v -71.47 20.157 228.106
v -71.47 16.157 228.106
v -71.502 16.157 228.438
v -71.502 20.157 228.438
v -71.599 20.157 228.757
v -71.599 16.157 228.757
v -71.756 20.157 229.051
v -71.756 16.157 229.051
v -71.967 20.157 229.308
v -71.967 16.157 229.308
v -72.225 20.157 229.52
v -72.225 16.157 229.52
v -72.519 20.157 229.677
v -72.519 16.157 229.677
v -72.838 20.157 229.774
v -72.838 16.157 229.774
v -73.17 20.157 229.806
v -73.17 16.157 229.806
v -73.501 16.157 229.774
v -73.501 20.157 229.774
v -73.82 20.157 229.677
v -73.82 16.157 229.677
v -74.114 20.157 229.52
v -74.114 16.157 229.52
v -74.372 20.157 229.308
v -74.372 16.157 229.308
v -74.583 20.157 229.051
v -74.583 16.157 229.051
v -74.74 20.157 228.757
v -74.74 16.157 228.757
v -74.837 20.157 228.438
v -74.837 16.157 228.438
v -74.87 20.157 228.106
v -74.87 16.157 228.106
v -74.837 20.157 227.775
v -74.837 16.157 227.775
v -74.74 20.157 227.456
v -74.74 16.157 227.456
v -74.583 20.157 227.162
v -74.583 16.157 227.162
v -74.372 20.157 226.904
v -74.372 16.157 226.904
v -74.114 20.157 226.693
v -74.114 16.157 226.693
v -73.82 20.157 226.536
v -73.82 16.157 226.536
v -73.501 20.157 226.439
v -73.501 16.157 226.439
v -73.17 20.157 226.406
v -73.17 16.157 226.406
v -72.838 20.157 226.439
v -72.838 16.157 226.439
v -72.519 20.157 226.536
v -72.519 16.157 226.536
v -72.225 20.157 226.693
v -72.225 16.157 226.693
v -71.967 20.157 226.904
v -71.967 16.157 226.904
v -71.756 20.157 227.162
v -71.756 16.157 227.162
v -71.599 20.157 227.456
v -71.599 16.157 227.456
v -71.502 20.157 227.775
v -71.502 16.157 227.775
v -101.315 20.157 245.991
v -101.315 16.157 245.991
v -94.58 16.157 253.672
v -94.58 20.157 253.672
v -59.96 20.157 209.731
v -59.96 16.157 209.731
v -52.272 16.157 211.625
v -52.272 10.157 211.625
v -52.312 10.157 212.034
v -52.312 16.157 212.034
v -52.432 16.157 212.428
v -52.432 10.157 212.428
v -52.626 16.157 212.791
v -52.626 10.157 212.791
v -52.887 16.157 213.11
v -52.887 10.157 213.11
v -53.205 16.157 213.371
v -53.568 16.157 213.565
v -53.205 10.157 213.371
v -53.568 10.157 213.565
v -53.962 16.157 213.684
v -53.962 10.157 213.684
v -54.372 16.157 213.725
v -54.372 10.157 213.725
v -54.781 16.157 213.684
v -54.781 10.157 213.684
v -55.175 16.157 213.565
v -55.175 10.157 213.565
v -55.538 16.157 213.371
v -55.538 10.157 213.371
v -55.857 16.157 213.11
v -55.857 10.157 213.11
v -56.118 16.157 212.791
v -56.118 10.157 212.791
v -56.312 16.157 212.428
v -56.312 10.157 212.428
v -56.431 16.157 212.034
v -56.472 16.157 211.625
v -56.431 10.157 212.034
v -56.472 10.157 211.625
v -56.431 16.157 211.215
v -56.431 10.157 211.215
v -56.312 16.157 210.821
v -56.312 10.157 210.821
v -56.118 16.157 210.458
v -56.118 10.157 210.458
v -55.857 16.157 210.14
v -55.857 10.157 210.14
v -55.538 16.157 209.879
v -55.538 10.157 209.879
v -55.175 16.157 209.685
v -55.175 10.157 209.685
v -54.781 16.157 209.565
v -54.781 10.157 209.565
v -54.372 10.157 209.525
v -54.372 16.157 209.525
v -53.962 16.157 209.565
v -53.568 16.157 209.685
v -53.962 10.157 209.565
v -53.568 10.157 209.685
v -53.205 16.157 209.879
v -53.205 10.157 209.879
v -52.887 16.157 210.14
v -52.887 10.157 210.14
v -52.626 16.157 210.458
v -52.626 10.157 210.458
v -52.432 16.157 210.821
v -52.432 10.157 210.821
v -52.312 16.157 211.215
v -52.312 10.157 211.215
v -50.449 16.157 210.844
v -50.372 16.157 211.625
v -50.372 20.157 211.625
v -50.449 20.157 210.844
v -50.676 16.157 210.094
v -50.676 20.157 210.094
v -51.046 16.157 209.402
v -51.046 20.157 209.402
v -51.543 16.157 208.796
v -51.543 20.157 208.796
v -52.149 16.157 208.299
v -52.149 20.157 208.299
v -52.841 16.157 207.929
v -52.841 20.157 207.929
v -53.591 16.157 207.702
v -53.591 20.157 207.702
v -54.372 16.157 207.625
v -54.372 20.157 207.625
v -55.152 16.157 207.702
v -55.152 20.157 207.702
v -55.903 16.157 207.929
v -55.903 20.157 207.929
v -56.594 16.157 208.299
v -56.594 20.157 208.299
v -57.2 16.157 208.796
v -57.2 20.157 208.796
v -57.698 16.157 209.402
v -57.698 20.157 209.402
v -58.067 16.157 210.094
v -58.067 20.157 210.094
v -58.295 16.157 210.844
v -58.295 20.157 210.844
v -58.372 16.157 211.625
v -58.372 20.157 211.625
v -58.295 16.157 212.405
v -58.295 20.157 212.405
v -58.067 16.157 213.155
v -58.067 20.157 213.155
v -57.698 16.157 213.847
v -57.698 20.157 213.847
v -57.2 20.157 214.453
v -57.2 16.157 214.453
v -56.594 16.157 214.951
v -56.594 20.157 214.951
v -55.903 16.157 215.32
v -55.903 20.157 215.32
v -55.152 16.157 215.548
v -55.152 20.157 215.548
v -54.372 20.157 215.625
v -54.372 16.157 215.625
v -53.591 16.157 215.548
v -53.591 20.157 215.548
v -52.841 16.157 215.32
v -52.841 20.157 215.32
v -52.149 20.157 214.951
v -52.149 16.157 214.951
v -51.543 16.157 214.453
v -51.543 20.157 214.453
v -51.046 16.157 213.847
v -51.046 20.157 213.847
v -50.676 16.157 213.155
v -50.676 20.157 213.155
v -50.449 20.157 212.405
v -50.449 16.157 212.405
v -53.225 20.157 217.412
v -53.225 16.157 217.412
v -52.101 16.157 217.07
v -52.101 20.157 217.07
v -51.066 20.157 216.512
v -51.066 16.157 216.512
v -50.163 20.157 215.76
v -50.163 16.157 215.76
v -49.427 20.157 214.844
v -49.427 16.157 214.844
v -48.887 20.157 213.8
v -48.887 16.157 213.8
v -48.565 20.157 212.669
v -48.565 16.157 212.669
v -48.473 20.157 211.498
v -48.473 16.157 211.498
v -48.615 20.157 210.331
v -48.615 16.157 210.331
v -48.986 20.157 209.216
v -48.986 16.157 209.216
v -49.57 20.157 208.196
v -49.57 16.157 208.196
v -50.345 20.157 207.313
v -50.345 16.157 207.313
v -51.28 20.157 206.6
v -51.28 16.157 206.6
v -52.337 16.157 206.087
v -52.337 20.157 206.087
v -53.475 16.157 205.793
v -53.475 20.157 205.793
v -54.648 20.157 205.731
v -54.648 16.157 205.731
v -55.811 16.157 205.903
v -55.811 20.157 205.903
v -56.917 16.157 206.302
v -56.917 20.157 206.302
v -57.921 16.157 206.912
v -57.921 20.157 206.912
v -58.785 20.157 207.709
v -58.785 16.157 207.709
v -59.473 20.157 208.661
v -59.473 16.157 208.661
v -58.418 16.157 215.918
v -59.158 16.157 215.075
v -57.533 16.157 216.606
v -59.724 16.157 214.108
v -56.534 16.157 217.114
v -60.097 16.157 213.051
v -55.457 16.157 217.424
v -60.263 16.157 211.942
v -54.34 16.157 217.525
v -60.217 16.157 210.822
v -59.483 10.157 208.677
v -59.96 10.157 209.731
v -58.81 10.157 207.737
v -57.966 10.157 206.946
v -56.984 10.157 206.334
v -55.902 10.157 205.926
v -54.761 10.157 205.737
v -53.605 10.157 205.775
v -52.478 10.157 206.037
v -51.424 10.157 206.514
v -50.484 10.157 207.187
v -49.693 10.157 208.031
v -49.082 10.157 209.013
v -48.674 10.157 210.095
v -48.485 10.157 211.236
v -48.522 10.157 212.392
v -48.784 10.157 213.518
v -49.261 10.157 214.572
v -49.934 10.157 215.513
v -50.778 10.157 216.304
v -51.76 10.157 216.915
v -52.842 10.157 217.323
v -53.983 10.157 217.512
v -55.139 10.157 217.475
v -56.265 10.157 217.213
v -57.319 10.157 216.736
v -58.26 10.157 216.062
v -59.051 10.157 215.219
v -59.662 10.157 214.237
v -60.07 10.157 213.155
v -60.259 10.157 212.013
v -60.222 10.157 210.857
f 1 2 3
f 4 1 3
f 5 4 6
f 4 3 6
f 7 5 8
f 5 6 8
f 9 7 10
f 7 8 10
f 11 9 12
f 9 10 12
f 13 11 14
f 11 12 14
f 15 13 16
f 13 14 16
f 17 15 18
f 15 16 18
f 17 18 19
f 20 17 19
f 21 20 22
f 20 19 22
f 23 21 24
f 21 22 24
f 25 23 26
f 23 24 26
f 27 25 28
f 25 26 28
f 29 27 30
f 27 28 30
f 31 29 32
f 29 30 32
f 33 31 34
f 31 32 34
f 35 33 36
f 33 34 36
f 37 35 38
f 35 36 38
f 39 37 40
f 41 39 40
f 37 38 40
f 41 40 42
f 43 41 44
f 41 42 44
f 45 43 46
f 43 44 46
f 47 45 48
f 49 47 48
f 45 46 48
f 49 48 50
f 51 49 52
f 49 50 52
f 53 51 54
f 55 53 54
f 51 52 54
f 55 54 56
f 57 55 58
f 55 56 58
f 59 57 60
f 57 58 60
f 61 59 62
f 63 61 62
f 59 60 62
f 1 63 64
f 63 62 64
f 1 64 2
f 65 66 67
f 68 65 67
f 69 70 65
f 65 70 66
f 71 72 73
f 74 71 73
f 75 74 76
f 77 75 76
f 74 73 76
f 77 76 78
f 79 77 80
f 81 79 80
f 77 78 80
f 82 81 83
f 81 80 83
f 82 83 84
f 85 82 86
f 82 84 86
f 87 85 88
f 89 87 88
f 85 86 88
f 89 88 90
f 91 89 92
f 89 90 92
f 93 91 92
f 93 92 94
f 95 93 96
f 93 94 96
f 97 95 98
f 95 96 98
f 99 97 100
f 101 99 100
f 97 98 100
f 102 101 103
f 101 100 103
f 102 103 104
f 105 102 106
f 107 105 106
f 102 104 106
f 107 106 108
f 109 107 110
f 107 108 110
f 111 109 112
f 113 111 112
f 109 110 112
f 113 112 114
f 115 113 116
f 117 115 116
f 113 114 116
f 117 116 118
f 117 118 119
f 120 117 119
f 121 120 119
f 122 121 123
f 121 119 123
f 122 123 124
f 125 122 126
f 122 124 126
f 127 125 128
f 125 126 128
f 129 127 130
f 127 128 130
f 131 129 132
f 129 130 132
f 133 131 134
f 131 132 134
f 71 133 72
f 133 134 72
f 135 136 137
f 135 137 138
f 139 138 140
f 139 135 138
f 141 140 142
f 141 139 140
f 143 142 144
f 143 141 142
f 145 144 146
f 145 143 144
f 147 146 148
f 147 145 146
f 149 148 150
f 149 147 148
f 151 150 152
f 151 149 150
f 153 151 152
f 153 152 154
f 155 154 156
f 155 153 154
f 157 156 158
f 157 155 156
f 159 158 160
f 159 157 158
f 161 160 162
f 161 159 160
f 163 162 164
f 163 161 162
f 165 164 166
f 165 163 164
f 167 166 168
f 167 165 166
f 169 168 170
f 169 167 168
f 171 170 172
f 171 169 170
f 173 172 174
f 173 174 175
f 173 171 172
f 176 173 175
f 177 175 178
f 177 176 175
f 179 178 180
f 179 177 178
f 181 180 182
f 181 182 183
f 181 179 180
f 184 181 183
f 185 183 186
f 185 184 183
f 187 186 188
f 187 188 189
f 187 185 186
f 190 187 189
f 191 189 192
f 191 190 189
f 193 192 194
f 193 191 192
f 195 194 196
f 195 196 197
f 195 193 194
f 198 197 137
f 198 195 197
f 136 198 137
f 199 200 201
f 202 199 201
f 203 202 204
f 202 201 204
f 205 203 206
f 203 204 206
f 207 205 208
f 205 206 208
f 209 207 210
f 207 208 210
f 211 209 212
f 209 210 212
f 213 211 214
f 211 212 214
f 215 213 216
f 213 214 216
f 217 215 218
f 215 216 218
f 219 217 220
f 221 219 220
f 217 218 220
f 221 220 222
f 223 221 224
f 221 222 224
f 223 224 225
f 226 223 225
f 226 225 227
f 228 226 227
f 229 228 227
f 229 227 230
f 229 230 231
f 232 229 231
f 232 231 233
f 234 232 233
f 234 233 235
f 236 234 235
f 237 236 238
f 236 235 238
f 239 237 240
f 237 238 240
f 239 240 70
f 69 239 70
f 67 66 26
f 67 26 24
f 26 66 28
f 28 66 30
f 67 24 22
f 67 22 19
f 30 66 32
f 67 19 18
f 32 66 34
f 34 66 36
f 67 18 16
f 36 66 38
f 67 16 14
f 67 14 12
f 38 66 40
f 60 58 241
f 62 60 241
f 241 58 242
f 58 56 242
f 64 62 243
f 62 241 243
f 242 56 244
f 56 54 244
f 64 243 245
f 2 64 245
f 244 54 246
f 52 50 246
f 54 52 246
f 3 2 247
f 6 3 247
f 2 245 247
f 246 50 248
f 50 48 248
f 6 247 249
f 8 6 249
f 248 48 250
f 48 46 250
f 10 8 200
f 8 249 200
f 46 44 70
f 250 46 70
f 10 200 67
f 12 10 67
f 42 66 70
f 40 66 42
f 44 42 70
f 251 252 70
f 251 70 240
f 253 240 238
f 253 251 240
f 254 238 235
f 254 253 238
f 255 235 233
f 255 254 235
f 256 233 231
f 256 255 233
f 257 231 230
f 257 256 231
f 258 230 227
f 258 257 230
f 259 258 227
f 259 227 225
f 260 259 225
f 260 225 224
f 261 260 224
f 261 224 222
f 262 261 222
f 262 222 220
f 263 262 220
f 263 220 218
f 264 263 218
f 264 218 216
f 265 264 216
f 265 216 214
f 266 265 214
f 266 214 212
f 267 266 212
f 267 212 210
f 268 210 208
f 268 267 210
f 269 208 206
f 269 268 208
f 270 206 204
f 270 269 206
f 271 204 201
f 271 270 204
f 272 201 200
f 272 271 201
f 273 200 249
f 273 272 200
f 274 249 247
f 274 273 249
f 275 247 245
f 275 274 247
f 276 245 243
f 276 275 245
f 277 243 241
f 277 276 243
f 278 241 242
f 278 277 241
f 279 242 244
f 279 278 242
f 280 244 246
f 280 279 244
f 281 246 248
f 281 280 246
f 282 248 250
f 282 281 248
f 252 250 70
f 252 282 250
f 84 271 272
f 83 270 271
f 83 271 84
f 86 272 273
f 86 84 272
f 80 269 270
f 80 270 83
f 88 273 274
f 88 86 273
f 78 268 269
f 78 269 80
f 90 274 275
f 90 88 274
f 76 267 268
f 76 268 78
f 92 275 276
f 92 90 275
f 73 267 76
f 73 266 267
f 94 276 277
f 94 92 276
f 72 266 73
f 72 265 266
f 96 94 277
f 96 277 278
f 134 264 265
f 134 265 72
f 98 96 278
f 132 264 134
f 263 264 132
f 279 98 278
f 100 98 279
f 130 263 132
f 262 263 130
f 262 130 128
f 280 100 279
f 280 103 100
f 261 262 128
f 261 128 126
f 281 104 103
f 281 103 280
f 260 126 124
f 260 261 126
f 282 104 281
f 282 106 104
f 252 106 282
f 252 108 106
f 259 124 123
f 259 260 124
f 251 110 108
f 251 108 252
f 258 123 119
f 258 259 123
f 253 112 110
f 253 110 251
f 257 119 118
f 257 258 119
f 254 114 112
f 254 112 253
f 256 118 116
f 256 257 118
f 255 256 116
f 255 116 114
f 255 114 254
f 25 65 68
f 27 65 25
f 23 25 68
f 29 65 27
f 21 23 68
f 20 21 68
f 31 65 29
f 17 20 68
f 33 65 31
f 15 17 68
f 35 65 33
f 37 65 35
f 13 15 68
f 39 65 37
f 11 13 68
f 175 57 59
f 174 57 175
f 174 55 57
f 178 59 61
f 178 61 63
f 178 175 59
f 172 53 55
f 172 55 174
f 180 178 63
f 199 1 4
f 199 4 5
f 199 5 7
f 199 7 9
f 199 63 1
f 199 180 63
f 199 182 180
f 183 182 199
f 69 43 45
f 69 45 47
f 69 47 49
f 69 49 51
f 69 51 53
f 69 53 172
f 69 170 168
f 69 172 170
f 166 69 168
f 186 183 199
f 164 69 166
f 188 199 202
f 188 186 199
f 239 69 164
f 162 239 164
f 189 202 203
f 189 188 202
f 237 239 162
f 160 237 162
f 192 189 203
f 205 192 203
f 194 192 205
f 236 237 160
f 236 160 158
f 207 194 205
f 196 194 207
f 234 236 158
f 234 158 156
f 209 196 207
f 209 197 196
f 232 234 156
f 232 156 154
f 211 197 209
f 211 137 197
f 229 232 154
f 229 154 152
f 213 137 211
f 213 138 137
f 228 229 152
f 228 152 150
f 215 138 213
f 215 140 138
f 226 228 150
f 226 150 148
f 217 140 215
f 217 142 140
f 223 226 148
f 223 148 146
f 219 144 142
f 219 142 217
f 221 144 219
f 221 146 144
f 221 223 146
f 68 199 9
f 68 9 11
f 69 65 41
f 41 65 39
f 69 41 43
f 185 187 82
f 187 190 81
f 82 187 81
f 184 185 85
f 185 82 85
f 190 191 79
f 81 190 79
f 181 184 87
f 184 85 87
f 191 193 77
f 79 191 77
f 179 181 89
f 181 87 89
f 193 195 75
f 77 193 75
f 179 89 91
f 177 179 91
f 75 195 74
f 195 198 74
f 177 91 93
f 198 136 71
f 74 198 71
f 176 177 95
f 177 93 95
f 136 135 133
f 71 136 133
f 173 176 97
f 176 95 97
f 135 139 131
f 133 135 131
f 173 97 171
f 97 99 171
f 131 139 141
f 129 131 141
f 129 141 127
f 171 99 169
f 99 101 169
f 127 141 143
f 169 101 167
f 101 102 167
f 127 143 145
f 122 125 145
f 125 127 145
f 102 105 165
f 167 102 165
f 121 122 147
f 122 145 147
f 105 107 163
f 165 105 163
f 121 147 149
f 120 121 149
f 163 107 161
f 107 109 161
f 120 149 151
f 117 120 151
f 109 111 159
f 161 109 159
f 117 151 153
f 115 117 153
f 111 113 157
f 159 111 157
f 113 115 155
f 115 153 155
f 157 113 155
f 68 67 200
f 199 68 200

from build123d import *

# Parameters (mm, degrees)
EXTRUDE_START       = -4
EXTRUDE_1_OUTLINE_R = 4
EXTRUDE_1_DEPTH     = 4
EXTRUDE_START_2     = 6
SKETCH_2_R          = 5.9
SKETCH_2_R_2        = 2.1
EXTRUDE_2_DEPTH     = 6
SKETCH_3_R          = 1.7
CUT_EXTRUDE_1_DEPTH = 4


# Read off the part's stored shape, not the designer's step: 填料-伸長1
with BuildPart() as part:
    # 填料-伸長1 outline → 填料-伸長1 (new body)
    with BuildSketch(Plane(origin=(0, 20.156954032, 0), x_dir=(1, 0, 0), z_dir=(0, 1, 0)).offset(EXTRUDE_START)):
        with BuildLine():
            Line((-94.580009895, -253.67166291), (-53.224889363, -217.412126153))
            ThreePointArc((-53.224889363, -217.412126153), (-49.935495794, -207.73500968), (-59.959608209, -209.730971497))
            Line((-59.959608209, -209.730971497), (-101.314728741, -245.990508253))
            Line((-101.314728741, -245.990508253), (-94.580009895, -253.67166291))
        make_face()
        with Locations((-54.371772361, -211.624669079)):
            Circle(EXTRUDE_1_OUTLINE_R, mode=Mode.SUBTRACT)
    extrude(amount=EXTRUDE_1_DEPTH)

    # 草圖2 → 填料-伸長2 (add)
    with BuildSketch(Plane.XZ.offset(-16.156954032).offset(EXTRUDE_START_2)):
        with Locations(Location((-54.371772361, 211.624669079, 0), (0, 0, 198.721335886))):
            Circle(SKETCH_2_R)
        with Locations((-54.371772361, 211.624669079)):
            Circle(SKETCH_2_R_2, mode=Mode.SUBTRACT)
    extrude(amount=-EXTRUDE_2_DEPTH)

    # 草圖3 → 除料-伸長1 (cut)
    with BuildSketch(Plane.XZ.offset(-16.156954032)):
        with Locations((-73.169554421, 228.106276695)):
            Circle(SKETCH_3_R)
    extrude(amount=-CUT_EXTRUDE_1_DEPTH, mode=Mode.SUBTRACT)


solid = part.part
